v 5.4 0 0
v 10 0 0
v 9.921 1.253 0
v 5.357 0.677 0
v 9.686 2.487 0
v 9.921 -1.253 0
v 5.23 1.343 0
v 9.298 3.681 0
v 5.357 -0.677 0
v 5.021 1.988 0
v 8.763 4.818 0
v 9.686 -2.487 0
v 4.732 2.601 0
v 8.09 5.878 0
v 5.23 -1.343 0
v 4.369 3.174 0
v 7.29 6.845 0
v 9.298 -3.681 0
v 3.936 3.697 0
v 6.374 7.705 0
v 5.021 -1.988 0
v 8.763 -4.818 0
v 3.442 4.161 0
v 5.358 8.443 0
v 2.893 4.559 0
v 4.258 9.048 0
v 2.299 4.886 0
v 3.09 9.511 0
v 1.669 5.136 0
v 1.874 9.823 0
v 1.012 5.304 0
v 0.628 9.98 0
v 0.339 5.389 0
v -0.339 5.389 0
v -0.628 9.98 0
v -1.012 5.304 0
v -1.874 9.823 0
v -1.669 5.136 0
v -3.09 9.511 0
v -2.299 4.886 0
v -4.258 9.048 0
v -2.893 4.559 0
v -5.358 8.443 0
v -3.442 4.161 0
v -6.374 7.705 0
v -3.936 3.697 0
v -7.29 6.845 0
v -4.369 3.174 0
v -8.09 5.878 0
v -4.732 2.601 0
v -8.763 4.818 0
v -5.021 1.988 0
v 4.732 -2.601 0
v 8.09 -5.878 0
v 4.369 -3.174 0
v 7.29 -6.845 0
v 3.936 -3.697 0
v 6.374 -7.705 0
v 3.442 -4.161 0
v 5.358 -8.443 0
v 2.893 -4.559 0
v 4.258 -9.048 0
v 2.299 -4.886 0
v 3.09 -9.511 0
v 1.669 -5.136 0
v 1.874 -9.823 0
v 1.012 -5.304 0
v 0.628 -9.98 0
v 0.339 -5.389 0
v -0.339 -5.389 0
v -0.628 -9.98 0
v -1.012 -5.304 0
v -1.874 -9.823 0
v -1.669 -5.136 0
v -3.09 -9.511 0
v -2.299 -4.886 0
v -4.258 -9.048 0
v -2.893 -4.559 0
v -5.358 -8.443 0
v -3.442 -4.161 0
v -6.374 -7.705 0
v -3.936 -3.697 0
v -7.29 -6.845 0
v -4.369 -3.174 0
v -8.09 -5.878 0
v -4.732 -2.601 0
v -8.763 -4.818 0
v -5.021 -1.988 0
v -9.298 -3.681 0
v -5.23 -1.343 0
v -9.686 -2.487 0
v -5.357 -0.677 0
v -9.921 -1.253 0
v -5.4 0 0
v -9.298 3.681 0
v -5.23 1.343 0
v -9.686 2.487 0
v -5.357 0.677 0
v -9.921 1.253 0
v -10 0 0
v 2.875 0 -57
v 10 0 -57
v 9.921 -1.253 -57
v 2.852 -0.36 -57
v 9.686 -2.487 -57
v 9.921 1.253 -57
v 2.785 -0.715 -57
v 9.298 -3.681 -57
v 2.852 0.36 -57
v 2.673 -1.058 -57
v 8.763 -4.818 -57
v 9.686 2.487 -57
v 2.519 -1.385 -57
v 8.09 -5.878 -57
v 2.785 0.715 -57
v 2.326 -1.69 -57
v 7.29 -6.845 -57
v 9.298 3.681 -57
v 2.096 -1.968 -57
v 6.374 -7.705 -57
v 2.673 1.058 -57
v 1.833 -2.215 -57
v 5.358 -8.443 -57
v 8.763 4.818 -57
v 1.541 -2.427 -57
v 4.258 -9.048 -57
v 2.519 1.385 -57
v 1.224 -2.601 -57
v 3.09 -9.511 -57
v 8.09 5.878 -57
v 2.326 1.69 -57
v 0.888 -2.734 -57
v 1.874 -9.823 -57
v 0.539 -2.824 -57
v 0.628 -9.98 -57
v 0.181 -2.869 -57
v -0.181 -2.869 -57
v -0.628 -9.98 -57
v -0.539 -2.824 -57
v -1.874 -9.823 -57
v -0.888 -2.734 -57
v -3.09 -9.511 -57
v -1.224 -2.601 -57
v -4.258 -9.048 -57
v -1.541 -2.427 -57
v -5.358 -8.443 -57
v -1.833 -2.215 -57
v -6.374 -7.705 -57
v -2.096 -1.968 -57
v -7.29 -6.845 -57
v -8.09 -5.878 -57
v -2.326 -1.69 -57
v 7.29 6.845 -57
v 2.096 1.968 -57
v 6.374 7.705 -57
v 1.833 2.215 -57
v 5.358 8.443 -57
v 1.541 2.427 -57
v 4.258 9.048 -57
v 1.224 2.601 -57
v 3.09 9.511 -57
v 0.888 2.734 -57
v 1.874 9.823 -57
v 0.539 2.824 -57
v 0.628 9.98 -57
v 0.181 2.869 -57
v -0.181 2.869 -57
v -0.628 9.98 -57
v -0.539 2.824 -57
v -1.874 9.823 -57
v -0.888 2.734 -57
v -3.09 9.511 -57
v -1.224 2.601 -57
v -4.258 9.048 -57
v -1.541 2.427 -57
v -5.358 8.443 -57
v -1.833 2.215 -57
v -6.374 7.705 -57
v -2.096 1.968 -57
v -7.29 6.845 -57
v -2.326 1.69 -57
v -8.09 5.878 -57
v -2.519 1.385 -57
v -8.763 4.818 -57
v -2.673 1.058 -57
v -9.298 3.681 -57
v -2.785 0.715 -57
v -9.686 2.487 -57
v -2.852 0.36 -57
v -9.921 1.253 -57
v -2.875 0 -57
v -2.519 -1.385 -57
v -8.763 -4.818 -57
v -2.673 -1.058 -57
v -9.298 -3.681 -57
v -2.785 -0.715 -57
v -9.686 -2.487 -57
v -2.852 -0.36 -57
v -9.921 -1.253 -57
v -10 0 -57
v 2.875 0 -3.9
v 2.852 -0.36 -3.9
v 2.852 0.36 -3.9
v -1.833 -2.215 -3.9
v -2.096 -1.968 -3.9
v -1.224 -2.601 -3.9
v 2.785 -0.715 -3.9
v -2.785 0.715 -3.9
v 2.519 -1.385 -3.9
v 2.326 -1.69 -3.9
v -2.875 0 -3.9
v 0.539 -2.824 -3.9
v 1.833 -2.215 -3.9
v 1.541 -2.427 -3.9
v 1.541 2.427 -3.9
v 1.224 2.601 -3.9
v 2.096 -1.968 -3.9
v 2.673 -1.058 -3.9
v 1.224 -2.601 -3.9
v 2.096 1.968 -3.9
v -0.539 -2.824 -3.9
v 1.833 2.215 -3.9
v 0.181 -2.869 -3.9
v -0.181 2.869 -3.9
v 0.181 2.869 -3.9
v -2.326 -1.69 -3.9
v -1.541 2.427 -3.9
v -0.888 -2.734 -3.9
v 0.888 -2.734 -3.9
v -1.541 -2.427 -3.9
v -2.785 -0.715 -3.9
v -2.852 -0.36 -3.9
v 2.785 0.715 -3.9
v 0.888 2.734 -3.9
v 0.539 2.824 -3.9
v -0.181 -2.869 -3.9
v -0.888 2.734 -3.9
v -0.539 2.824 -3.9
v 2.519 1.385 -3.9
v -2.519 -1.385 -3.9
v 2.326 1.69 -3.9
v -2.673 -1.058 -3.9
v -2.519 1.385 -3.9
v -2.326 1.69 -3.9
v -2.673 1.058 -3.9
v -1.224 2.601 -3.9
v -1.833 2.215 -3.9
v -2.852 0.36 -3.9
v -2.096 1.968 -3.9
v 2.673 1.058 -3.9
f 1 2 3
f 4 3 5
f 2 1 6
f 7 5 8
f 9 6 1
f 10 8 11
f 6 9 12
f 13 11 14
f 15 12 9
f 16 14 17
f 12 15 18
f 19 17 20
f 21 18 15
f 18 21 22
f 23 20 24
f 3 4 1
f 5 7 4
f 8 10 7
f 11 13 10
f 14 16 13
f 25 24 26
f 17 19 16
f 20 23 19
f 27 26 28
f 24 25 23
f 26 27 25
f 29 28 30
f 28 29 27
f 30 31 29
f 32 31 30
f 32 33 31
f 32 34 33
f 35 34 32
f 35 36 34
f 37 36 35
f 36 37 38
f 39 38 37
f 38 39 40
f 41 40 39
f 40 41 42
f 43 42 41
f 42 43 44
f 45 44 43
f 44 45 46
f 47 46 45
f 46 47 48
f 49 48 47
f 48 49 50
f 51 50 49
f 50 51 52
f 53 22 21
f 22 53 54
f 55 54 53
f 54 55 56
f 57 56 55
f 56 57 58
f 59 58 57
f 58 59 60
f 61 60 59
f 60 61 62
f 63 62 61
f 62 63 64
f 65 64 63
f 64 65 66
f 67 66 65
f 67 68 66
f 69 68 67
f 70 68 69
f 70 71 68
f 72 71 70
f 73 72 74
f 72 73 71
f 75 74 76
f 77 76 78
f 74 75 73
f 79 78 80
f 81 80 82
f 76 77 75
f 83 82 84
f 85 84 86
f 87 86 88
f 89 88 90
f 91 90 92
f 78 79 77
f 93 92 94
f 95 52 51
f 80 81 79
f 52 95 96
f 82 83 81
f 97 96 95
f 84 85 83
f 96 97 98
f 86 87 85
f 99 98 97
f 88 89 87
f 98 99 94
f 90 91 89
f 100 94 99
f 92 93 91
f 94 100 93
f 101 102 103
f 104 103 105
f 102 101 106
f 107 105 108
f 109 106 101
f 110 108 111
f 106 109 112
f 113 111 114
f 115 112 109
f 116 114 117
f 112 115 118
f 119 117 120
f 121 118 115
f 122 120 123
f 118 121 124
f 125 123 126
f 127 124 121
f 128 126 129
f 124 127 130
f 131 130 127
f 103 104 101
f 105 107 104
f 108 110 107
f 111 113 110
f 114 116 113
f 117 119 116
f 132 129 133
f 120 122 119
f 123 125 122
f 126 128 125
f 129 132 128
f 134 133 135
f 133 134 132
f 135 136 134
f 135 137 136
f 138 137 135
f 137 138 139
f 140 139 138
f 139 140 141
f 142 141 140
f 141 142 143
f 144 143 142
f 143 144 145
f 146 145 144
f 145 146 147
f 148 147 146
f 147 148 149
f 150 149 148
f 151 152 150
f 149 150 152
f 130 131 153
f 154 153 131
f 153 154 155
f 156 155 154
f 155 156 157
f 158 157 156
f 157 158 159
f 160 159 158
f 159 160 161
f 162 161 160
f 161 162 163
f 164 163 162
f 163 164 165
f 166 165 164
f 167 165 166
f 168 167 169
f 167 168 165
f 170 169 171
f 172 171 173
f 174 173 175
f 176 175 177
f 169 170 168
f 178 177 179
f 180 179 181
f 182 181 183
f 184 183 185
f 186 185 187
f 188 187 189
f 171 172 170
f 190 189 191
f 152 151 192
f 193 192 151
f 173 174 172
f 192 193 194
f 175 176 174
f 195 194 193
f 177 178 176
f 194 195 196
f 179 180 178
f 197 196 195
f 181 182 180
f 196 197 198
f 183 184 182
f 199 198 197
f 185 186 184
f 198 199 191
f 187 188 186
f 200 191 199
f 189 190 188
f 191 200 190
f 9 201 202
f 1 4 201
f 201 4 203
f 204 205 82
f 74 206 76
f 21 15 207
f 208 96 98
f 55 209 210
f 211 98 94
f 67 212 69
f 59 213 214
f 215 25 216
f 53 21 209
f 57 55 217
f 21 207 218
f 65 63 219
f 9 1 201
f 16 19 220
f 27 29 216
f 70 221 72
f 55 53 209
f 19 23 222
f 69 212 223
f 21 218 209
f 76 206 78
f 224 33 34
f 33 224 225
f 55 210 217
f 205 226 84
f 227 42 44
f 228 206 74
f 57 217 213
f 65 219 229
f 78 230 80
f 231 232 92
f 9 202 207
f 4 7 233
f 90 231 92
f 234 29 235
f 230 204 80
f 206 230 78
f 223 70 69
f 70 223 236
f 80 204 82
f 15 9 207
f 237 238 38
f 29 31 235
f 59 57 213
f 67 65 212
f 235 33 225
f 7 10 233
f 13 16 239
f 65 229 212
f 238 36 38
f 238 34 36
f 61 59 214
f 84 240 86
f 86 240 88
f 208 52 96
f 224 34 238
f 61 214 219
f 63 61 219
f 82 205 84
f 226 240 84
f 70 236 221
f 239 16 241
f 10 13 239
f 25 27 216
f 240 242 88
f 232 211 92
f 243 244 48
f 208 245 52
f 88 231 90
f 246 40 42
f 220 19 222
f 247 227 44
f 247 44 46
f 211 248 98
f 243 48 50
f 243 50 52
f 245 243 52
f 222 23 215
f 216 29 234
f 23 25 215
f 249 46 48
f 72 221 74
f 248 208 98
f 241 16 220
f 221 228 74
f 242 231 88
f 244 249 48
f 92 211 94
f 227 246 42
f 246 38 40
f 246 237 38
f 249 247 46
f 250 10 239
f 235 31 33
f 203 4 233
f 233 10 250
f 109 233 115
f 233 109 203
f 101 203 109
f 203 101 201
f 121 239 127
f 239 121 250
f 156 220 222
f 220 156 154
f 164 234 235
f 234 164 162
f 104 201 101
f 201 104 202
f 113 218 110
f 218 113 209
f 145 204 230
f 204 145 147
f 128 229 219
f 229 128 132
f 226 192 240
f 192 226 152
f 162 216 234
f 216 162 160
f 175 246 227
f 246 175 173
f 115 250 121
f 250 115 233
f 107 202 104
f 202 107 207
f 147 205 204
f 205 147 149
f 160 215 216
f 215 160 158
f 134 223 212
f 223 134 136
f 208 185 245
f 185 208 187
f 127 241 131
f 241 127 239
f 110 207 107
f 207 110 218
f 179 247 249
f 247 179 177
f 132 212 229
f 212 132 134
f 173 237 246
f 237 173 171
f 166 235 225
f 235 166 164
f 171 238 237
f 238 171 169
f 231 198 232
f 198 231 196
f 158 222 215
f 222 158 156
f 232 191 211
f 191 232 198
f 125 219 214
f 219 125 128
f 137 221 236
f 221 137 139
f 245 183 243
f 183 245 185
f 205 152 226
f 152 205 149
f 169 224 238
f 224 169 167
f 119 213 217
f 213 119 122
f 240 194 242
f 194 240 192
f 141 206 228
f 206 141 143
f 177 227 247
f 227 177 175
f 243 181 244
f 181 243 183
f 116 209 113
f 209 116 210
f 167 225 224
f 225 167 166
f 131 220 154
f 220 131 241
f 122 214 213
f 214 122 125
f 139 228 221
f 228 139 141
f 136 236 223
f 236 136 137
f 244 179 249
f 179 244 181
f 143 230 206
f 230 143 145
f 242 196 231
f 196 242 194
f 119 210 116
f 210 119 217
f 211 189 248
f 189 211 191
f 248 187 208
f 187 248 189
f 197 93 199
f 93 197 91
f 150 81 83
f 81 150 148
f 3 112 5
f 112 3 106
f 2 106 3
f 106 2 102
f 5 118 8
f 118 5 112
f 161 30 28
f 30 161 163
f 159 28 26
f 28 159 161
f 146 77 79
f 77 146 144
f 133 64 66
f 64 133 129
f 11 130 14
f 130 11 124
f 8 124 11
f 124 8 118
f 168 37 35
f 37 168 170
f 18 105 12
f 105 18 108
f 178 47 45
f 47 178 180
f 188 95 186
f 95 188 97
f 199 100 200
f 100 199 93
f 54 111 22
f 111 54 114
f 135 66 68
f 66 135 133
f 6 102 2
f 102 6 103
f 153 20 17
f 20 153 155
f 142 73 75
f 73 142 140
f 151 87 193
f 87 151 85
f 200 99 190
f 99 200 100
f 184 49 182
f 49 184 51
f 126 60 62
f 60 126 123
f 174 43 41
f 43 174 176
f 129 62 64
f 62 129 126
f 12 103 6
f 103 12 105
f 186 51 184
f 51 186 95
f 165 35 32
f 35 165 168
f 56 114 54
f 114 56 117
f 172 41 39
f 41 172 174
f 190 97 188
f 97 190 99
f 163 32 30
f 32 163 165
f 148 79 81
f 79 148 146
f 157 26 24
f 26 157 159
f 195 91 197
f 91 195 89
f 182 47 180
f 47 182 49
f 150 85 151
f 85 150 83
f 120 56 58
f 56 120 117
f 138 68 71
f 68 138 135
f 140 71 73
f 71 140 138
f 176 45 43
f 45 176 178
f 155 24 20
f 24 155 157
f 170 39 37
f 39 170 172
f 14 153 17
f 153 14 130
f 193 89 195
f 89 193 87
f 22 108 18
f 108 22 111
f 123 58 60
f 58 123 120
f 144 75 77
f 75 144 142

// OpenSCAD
$fn = 50;


difference() {
	union() {
		translate(v = [0, 0, -57.0000000000]) {
			cylinder(h = 57, r = 10.0000000000);
		}
		cylinder(h = 0, r = 20.0000000000);
	}
	union() {
		translate(v = [0, 0, 0]) {
			rotate(a = [0, 0, 0]) {
				difference() {
					union() {
						#translate(v = [0, 0, -57.0000000000]) {
							cylinder(h = 57, r = 2.6000000000);
						}
						#translate(v = [0, 0, -3.9000000000]) {
							cylinder(h = 3.9000000000, r1 = 2.8750000000, r2 = 5.4000000000);
						}
						#translate(v = [0, 0, -57.0000000000]) {
							cylinder(h = 57, r = 2.8750000000);
						}
						#translate(v = [0, 0, -57.0000000000]) {
							cylinder(h = 57, r = 2.6000000000);
						}
					}
					union();
				}
			}
		}
	}
}
